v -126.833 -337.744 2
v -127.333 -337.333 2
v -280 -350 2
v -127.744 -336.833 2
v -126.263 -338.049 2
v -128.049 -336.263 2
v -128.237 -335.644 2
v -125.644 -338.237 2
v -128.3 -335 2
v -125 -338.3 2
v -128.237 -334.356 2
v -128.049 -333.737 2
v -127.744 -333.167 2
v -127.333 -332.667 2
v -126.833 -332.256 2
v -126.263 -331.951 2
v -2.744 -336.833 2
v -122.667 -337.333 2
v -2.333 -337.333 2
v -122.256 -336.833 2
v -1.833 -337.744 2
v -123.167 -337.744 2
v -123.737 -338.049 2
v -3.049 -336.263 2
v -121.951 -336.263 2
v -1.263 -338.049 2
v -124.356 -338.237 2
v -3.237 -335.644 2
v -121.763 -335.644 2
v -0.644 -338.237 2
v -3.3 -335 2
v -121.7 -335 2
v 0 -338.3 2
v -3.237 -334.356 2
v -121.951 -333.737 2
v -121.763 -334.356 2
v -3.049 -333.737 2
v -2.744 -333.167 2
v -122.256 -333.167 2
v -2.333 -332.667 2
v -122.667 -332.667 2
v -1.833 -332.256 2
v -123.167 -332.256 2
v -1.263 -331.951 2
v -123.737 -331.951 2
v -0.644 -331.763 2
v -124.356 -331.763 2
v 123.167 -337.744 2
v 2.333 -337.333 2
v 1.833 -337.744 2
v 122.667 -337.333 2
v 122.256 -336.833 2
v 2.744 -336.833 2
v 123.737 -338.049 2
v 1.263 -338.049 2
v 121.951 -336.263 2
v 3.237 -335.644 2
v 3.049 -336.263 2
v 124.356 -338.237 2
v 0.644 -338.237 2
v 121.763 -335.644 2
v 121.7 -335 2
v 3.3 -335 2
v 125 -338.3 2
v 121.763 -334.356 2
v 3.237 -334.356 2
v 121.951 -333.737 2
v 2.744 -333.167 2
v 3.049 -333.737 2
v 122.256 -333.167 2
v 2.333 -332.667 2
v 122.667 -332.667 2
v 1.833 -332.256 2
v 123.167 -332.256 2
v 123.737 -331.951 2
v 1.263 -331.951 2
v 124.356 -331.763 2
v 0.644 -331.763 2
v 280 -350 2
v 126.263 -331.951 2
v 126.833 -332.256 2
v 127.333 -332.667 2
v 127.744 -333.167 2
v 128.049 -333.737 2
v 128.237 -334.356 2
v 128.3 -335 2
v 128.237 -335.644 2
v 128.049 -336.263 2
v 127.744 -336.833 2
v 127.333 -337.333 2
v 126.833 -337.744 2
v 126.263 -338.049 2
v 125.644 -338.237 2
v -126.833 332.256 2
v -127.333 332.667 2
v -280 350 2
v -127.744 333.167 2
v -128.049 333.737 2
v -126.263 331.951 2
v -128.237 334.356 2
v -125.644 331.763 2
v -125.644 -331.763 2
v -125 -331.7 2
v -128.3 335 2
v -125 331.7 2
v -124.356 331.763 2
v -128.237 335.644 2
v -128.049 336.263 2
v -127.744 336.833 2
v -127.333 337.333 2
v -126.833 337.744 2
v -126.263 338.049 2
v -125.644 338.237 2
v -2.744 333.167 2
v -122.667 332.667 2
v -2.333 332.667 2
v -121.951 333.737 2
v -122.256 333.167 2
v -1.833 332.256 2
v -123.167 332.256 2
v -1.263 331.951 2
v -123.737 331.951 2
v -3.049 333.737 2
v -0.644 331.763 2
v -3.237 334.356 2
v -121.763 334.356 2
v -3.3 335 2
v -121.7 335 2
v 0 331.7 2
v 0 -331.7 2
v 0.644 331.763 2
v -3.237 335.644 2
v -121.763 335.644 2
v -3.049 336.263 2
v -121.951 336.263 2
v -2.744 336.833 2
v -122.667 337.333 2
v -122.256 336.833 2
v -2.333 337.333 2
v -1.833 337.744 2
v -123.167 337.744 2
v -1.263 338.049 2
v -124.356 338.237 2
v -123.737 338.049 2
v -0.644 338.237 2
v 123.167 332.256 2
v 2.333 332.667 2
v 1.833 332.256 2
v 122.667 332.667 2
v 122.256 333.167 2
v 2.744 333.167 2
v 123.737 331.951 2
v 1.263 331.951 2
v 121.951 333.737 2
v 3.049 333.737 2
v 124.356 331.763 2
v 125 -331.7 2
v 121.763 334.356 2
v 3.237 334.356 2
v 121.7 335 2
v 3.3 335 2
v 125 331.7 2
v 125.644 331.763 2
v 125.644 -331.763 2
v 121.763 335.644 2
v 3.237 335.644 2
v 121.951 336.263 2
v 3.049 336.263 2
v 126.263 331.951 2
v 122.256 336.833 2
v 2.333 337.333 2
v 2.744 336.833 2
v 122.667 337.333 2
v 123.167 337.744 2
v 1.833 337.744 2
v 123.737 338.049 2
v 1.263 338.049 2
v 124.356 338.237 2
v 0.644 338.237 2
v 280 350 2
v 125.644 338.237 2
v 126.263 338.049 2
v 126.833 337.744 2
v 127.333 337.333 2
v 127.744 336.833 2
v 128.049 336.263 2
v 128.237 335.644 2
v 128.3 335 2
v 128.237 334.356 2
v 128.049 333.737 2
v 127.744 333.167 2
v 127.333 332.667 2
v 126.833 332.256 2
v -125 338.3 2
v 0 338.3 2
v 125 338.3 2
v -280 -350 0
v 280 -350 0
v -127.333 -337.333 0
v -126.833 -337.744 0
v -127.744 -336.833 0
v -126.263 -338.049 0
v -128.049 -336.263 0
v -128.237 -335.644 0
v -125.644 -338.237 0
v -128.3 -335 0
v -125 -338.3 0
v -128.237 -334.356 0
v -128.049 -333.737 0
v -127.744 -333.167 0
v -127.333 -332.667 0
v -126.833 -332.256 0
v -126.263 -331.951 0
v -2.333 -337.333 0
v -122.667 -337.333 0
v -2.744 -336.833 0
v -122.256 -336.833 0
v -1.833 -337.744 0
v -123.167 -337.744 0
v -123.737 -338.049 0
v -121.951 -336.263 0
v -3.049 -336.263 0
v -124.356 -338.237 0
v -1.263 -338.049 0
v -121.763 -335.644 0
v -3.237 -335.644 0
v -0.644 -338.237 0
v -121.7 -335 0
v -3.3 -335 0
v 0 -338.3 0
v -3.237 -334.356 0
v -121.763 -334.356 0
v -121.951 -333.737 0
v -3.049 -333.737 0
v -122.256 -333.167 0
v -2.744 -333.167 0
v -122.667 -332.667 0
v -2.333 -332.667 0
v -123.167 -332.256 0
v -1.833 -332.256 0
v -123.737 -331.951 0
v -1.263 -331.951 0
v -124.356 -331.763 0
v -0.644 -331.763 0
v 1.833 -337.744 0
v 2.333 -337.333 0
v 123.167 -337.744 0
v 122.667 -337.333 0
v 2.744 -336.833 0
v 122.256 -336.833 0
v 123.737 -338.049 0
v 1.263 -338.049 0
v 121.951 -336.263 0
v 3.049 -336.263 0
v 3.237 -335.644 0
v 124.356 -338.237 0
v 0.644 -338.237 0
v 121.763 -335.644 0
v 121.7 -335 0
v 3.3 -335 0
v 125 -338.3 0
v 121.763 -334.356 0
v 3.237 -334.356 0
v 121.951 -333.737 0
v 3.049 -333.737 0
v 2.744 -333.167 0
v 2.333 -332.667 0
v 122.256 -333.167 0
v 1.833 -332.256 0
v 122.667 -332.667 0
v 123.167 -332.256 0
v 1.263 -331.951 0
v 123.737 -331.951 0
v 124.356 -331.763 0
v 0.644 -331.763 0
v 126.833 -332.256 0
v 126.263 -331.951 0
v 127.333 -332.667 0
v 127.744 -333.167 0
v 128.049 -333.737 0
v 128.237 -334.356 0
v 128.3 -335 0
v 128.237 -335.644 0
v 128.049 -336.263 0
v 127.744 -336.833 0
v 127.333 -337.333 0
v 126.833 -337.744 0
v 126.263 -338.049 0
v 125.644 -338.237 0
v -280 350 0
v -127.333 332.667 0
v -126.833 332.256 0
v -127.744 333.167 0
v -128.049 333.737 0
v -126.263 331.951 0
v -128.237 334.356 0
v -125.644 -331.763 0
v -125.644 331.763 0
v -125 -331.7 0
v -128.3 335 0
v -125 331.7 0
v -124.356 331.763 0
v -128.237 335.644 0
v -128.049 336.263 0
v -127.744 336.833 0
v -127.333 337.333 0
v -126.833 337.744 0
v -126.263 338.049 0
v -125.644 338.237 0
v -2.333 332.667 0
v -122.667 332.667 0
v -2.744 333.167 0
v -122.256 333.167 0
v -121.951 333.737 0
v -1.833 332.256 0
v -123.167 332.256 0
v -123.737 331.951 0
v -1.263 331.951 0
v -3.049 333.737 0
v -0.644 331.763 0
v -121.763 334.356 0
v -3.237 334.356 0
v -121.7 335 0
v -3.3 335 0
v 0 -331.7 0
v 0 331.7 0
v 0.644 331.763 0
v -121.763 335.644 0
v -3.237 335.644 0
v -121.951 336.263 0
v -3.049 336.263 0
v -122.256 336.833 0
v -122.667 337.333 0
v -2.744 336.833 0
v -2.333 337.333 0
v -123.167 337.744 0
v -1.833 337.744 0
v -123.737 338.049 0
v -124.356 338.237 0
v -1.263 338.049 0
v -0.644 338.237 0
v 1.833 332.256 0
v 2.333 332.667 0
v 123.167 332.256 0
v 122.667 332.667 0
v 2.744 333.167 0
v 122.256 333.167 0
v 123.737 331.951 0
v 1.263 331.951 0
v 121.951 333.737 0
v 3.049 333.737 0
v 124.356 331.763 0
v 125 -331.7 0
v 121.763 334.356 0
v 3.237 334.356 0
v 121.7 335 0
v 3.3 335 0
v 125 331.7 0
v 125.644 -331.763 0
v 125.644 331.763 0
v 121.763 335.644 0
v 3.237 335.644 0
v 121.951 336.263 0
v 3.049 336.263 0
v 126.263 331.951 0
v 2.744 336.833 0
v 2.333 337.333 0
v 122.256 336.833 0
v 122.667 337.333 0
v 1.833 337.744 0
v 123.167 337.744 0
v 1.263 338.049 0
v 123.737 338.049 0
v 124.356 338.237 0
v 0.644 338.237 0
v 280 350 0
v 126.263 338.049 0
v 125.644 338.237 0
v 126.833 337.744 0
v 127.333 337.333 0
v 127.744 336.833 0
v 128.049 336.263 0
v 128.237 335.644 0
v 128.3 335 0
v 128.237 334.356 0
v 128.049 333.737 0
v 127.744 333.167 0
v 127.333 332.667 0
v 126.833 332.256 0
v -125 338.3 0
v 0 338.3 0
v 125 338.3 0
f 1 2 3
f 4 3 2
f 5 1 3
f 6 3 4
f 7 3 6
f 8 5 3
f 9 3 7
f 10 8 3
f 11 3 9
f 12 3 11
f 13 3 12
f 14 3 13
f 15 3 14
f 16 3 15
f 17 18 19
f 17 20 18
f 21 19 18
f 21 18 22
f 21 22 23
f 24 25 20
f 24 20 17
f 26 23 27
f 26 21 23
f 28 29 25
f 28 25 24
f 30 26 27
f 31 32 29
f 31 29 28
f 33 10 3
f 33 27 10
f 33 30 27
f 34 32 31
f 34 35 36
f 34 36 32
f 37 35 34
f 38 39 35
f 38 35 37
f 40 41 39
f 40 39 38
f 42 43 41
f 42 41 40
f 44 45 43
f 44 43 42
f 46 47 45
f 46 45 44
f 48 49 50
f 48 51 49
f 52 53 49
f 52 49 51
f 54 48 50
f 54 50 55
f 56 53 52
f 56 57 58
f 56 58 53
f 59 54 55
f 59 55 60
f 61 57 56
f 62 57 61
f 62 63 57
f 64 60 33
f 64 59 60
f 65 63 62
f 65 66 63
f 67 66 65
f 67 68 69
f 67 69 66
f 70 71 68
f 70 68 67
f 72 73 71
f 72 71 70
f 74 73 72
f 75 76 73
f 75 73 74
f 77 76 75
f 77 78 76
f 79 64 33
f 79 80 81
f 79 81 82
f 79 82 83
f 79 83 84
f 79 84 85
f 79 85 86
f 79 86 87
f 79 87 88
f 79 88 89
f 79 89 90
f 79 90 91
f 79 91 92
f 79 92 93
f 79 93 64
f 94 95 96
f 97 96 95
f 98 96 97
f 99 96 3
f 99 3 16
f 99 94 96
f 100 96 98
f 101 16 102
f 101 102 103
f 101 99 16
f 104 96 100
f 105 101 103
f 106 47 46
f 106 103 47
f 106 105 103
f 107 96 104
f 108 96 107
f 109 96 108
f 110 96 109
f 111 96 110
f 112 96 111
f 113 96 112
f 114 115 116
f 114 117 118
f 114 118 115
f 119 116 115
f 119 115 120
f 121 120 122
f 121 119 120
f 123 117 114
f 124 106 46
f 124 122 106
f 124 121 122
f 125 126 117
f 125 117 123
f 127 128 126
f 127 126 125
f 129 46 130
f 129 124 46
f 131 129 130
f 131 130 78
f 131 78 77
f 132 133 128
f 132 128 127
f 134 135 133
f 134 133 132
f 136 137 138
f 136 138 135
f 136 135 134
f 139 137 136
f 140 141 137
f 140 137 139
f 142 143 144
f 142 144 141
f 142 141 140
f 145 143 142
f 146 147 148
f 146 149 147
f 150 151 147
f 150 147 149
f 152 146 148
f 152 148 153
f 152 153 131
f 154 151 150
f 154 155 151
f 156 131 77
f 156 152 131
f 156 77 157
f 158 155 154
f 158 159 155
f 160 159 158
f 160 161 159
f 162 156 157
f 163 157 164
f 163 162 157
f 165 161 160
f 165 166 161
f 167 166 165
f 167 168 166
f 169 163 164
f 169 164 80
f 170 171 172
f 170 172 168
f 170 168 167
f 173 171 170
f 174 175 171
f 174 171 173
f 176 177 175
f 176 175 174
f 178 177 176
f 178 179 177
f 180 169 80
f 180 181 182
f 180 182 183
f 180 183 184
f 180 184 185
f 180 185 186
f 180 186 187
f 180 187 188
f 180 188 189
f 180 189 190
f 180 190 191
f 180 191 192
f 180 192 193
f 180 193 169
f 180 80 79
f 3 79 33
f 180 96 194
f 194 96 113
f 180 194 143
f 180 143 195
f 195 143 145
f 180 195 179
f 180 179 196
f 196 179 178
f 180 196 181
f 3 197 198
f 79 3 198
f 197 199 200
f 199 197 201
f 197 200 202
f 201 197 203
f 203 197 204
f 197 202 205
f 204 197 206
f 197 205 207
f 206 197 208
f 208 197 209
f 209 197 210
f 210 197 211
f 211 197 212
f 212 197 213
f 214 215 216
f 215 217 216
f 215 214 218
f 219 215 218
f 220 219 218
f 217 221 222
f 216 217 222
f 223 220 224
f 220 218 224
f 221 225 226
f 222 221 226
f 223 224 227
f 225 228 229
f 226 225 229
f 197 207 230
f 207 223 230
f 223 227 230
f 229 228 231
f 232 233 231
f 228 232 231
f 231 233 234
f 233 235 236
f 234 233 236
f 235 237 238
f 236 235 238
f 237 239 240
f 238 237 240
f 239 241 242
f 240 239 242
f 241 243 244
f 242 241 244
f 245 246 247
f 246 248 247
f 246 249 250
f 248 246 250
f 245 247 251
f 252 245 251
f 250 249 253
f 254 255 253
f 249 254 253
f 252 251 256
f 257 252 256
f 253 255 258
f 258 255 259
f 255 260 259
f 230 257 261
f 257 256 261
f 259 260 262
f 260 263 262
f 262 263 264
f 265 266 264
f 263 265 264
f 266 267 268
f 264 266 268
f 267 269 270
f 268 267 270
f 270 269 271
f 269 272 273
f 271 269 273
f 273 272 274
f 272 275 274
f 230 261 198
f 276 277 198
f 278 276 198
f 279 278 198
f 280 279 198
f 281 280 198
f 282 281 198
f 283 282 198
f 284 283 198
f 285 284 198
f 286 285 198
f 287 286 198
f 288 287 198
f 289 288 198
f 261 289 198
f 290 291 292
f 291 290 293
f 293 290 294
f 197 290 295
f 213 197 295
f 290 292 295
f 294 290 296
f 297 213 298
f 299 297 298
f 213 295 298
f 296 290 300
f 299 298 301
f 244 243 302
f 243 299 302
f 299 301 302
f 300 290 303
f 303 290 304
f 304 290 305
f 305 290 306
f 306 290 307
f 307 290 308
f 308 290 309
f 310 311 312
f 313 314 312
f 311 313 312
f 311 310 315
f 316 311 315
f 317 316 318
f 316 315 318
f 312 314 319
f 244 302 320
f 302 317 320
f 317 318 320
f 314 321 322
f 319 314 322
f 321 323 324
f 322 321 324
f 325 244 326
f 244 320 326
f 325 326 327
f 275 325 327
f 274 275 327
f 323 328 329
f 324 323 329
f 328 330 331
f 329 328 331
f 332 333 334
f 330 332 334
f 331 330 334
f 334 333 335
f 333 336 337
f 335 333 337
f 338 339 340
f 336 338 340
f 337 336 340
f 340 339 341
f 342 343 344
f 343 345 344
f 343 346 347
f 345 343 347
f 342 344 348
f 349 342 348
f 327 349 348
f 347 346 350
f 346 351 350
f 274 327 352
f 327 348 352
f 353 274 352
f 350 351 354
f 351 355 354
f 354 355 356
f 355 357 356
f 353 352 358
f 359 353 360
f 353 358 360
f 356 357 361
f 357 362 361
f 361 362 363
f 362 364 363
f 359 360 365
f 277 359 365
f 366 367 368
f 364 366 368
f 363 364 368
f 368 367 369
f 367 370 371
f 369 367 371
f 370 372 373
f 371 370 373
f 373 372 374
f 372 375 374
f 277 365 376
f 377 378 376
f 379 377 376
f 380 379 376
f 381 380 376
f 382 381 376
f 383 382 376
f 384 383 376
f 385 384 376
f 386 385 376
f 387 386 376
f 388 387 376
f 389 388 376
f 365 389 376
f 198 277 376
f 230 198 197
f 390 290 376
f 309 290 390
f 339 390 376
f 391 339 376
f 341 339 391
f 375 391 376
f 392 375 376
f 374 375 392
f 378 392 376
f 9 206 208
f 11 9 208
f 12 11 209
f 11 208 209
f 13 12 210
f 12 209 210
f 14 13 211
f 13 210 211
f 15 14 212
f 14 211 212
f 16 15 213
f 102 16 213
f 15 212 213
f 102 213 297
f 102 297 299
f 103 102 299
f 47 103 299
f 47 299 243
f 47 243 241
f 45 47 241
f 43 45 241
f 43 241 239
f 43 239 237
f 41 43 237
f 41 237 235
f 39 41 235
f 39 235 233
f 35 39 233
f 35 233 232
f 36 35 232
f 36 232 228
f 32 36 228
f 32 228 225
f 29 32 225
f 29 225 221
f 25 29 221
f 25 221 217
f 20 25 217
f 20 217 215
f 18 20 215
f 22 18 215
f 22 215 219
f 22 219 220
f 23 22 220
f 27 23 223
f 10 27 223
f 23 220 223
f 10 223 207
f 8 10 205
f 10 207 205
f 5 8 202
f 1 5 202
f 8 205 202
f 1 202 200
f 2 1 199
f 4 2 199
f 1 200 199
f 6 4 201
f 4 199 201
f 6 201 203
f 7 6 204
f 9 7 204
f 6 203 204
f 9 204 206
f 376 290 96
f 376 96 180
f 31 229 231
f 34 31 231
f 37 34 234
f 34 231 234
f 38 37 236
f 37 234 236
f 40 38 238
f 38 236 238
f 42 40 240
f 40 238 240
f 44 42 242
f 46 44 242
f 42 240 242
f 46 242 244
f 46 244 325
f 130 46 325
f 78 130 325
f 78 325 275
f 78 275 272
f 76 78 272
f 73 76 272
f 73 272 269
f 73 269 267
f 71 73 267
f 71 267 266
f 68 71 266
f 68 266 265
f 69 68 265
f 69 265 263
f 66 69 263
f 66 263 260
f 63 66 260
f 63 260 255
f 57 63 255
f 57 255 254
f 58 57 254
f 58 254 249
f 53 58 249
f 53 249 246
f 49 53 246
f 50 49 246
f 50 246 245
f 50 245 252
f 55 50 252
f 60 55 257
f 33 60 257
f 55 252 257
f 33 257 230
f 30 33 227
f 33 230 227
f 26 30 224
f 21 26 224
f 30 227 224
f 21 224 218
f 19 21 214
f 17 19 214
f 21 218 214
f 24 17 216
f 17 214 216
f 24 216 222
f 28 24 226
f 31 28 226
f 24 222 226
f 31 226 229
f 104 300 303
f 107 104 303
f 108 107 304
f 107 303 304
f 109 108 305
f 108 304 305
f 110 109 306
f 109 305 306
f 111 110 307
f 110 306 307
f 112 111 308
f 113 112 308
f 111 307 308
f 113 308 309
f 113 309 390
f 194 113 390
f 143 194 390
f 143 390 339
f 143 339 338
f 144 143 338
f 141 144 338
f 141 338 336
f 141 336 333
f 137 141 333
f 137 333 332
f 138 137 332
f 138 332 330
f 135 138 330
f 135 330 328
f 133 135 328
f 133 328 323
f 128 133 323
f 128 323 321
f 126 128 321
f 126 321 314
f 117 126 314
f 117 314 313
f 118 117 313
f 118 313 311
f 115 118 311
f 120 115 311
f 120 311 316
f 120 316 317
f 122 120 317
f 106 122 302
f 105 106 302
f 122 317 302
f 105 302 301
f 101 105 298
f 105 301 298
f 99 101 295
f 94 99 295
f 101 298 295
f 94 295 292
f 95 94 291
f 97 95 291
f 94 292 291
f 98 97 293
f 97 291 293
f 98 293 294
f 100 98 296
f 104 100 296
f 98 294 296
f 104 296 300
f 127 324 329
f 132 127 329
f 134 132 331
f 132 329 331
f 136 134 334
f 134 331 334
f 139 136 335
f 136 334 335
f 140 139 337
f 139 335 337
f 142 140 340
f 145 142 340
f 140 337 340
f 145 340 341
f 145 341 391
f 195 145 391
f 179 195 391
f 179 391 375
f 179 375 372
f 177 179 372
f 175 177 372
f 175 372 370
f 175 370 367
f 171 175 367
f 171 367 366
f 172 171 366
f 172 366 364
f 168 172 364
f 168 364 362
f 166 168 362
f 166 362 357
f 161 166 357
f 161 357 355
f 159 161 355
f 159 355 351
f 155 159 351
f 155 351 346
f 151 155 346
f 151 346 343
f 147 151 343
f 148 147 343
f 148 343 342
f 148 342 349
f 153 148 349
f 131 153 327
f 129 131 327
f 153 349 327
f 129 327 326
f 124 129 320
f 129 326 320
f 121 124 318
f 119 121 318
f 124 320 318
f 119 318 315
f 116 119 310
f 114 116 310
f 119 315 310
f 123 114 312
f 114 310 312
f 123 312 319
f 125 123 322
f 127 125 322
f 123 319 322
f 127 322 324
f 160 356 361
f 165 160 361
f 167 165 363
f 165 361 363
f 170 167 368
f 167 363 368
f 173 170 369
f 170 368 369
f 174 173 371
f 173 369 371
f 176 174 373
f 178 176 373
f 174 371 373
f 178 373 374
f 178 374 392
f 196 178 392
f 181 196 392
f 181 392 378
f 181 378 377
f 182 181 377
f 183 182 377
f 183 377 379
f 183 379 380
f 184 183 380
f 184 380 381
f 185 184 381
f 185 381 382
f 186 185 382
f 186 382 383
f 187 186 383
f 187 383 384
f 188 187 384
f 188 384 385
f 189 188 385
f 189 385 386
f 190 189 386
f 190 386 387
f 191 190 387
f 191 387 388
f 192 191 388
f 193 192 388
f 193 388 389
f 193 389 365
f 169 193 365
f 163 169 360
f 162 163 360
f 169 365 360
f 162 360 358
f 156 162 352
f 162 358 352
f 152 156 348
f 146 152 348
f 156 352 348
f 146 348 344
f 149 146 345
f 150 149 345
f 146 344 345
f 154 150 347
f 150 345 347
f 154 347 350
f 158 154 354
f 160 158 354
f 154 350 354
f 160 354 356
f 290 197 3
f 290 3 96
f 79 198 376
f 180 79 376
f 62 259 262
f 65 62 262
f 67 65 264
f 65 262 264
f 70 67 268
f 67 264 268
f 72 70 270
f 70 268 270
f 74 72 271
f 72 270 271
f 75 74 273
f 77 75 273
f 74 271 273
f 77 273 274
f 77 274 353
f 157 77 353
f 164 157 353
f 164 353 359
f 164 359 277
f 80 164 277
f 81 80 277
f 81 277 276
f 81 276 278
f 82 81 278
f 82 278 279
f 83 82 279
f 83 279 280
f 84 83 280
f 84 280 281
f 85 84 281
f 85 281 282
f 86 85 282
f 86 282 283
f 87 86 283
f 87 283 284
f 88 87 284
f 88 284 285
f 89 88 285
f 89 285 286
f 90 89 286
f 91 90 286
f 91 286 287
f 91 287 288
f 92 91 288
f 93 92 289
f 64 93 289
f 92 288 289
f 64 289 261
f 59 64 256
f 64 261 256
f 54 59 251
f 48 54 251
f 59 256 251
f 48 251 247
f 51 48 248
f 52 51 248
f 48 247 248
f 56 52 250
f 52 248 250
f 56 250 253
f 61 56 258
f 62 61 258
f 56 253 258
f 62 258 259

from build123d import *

# Parameters (mm, degrees)
F0_W     = 560
F0_H     = 700
F1_DEPTH = 2
F3_D     = 6.6


with BuildPart() as f1:
    # F0 (on Top) → F1 (new body)
    with BuildSketch(Plane.XY):
        Rectangle(F0_W, F0_H)
    extrude(amount=F1_DEPTH)

    # F3 (through all)
    with Locations(Plane.XY.offset(2)):
        with Locations((-125, 335), (0, 335), (125, 335), (125, -335), (0, -335), (-125, -335)):
            Hole(F3_D / 2)


solid = f1.part
